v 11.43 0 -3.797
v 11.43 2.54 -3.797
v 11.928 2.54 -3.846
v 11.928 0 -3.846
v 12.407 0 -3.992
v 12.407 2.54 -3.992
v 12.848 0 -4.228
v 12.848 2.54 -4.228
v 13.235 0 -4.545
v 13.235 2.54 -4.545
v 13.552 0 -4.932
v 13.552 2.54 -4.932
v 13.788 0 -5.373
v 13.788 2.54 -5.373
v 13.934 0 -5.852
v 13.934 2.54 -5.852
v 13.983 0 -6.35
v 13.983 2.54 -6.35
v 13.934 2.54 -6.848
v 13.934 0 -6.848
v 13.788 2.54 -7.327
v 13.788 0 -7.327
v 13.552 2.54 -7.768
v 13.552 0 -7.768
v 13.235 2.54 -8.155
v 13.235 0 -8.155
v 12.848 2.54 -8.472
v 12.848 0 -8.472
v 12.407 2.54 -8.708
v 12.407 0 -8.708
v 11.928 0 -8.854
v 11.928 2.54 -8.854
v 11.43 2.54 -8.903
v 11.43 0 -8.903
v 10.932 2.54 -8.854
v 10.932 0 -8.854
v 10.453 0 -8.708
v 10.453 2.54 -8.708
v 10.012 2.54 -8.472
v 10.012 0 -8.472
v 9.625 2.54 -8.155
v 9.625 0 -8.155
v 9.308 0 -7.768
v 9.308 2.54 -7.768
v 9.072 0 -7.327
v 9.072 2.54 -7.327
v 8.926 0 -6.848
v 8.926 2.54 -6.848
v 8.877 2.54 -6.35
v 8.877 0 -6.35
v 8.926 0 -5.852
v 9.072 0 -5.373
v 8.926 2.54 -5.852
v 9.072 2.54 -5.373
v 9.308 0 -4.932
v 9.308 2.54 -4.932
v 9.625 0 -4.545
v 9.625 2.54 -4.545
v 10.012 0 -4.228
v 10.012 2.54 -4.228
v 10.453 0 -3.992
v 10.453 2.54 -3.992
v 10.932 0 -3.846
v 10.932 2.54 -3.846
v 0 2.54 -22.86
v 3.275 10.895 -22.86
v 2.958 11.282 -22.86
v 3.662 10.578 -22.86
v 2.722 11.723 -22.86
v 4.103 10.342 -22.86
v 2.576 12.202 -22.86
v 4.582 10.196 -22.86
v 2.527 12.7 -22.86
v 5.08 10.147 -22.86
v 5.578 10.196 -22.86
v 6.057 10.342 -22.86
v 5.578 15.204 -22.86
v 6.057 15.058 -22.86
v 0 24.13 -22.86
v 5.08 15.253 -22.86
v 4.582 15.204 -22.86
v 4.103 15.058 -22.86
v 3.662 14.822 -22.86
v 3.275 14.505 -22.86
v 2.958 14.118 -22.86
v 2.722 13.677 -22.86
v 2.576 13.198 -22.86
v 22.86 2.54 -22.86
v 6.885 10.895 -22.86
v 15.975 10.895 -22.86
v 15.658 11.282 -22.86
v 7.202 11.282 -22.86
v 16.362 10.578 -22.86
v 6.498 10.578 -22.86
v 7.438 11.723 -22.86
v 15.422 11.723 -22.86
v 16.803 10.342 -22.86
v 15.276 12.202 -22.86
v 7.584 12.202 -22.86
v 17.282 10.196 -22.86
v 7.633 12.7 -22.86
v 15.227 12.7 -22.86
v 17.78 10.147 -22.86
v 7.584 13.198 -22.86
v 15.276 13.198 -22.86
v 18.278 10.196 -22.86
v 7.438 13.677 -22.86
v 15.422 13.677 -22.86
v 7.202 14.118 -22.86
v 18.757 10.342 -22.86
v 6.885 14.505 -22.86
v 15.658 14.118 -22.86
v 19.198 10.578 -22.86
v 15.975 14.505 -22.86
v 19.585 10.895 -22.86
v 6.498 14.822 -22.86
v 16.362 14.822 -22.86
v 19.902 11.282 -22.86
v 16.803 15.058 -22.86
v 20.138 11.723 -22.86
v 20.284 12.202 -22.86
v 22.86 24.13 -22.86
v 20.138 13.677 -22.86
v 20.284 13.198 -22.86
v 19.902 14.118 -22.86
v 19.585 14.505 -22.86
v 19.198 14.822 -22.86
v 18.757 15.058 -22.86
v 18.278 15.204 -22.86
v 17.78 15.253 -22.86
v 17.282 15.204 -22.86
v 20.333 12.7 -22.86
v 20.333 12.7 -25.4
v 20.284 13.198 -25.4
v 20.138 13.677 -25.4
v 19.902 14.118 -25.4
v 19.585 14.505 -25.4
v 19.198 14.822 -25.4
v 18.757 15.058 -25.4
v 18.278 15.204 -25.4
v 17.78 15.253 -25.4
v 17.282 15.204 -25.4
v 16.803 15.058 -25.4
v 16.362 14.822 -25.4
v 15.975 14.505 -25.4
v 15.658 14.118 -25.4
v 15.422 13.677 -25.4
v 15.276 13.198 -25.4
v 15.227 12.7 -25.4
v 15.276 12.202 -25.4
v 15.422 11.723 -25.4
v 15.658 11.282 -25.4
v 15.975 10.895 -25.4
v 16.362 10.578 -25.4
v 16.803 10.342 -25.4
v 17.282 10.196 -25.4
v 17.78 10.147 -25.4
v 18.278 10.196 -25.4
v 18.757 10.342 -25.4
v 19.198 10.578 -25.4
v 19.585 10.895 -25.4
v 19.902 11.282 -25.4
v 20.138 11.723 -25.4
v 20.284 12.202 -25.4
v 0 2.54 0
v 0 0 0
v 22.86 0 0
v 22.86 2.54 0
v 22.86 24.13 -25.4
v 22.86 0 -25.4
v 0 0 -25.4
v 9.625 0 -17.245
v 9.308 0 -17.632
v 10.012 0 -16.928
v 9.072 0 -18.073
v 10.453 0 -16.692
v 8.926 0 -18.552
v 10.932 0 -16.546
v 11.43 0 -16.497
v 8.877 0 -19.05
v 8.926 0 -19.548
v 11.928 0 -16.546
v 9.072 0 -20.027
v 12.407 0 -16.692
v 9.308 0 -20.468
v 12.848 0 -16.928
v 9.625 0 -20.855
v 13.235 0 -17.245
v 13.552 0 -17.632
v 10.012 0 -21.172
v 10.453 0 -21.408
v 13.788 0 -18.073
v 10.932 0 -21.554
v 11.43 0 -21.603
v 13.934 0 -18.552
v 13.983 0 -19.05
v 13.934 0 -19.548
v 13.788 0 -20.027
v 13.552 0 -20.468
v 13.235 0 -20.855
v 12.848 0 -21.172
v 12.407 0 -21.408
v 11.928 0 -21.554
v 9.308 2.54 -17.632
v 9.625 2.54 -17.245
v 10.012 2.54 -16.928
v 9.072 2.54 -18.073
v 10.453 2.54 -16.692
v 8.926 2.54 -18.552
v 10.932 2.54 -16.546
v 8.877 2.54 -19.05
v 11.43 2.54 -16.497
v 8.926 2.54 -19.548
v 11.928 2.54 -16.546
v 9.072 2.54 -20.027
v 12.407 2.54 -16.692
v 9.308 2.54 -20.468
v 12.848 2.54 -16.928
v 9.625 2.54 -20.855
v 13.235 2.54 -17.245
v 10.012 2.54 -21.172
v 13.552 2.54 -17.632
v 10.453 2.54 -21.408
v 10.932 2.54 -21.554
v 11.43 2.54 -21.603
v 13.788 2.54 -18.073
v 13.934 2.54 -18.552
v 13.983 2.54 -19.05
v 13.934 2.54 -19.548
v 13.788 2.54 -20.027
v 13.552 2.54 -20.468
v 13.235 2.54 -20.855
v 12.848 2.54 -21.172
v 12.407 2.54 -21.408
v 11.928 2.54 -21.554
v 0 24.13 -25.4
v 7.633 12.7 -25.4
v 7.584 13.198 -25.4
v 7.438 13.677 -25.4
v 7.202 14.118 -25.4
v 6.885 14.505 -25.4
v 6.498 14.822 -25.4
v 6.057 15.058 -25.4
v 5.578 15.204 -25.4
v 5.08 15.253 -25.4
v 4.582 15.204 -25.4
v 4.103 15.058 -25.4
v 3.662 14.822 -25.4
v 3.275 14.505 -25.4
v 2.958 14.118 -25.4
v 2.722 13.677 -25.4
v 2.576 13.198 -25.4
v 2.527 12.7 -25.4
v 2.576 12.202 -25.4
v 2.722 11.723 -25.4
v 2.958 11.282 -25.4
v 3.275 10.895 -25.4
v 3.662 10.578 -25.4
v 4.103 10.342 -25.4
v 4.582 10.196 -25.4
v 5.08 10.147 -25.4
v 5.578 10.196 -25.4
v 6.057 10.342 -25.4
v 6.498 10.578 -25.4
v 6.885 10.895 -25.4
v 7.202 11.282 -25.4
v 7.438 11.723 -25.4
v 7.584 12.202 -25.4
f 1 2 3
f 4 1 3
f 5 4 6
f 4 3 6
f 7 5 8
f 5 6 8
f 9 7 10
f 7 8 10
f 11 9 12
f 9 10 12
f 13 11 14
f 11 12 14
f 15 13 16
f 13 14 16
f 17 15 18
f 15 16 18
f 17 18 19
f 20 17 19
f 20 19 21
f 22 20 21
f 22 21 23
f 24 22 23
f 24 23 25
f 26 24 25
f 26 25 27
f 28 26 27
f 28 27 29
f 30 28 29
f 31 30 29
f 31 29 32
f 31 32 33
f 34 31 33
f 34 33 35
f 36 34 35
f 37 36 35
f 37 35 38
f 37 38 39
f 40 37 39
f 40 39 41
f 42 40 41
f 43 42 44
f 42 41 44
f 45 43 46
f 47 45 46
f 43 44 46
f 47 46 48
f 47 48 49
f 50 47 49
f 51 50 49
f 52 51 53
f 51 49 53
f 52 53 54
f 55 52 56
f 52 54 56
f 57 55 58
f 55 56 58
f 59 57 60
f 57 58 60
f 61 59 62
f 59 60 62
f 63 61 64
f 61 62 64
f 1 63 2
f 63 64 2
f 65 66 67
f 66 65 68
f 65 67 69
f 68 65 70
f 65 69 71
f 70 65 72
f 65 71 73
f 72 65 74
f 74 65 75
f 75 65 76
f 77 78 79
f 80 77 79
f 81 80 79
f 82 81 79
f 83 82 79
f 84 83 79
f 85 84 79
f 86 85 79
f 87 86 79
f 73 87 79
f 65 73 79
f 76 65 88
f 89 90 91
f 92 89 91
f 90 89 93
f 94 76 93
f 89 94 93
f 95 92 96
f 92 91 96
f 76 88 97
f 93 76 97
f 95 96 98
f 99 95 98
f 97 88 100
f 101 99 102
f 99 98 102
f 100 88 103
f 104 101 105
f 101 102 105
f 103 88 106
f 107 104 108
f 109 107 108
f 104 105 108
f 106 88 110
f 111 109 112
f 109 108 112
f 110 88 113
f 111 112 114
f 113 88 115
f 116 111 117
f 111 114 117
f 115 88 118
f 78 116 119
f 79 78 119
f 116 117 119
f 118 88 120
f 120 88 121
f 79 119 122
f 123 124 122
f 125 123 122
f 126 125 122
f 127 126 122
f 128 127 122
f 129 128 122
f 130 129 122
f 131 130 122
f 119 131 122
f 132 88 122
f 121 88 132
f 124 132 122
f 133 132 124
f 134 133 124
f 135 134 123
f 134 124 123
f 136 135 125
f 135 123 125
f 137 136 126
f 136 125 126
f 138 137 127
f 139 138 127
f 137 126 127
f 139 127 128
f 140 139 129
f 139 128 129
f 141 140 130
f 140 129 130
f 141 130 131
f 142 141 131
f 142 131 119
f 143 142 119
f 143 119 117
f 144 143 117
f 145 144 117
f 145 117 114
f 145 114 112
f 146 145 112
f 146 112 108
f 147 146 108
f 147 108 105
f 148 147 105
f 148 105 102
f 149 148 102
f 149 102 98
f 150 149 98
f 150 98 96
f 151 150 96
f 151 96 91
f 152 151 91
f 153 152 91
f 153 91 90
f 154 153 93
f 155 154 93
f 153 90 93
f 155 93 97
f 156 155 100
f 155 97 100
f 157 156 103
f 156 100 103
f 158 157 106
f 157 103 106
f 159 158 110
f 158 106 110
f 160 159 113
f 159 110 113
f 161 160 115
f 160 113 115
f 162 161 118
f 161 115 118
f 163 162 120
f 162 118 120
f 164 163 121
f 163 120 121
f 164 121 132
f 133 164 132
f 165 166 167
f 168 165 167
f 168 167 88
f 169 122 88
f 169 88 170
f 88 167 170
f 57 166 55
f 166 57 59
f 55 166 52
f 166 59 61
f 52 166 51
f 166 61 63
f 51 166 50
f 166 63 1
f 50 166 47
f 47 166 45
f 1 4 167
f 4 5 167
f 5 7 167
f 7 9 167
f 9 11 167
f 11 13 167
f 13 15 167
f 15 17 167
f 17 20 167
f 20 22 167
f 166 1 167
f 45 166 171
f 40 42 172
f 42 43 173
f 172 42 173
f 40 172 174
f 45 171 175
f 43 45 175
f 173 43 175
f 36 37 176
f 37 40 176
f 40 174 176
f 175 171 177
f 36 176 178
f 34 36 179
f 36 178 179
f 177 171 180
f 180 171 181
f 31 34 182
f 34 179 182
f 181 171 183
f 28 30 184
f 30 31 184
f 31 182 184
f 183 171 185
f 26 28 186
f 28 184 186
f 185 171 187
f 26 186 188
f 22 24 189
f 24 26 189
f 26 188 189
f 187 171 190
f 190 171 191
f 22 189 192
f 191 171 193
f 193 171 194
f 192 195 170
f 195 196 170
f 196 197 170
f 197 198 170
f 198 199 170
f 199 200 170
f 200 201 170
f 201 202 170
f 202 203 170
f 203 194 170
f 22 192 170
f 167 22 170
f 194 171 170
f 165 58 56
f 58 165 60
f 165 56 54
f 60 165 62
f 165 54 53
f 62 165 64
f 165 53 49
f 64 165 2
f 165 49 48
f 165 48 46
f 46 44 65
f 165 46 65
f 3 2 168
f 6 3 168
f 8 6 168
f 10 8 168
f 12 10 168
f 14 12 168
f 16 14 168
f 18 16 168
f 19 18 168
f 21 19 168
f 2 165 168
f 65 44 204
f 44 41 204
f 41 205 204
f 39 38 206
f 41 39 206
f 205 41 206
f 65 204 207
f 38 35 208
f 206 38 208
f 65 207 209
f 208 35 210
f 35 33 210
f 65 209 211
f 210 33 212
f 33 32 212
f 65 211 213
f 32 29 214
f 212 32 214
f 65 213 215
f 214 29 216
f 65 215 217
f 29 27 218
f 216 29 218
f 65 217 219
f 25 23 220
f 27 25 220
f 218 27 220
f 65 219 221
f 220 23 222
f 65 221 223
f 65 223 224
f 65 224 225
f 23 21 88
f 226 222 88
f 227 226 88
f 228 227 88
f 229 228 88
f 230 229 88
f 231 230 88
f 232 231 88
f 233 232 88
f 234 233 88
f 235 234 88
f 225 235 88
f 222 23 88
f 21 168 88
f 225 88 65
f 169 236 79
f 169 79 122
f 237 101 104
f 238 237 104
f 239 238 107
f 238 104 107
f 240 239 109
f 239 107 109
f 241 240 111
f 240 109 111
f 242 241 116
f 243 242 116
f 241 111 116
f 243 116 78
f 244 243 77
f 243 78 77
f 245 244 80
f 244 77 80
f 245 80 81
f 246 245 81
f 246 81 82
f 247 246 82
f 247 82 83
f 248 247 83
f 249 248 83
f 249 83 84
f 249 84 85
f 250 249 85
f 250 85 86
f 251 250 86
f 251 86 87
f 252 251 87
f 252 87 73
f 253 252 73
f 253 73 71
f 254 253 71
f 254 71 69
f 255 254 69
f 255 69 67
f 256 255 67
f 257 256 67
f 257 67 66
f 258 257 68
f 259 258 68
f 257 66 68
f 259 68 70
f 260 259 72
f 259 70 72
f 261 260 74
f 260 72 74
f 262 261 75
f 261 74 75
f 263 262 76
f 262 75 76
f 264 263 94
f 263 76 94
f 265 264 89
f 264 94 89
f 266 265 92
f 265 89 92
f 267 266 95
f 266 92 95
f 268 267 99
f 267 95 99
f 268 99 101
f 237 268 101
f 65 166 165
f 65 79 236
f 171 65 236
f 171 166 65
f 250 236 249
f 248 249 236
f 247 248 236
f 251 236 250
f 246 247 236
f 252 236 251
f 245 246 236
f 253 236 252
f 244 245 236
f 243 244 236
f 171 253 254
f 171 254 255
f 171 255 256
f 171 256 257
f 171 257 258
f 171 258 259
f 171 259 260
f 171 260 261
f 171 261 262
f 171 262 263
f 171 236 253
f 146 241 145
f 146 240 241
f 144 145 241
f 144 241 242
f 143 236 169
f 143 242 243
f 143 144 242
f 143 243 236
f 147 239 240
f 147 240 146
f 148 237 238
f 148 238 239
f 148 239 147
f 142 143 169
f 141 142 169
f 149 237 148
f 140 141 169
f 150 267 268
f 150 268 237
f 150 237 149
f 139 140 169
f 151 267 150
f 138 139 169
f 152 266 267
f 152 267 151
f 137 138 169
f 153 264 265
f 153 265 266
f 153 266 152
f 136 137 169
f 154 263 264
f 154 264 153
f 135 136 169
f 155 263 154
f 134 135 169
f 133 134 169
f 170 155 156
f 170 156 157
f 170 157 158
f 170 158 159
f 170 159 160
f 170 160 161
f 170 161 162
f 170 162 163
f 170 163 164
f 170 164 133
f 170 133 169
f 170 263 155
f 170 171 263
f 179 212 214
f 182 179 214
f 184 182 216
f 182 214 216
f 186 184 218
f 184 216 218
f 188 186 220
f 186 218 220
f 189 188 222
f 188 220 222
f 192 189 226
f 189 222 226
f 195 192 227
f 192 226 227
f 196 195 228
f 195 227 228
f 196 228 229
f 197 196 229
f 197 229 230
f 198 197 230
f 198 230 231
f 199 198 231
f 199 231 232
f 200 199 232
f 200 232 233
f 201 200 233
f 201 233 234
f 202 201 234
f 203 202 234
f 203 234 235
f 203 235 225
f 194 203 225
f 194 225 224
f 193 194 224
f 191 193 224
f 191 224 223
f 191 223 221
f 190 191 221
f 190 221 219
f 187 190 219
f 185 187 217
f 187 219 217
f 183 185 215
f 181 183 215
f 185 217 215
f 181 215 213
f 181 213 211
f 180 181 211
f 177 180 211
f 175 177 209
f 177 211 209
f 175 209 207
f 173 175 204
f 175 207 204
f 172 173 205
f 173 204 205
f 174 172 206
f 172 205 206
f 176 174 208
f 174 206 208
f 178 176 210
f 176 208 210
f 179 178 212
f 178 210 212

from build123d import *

# Parameters (mm, degrees)
SKETCH1_W           = 22.86
SKETCH1_H           = 25.4
BOSS_EXTRUDE1_DEPTH = 24.13
SKETCH2_W           = 22.86
SKETCH2_H           = 21.59
CUT_EXTRUDE1_DEPTH  = 42.832959494
SKETCH3_R           = 2.5527
CUT_EXTRUDE2_DEPTH  = 41.421129376
SKETCH4_R           = 2.5527
CUT_EXTRUDE3_DEPTH  = 41.341245643


with BuildPart() as part:
    # Sketch1 → Boss-Extrude1 (new body)
    with BuildSketch(Plane(origin=(0, 0, 0), x_dir=(1, 0, 0), z_dir=(0, 1, 0))):
        with Locations((11.43, 12.7)):
            Rectangle(SKETCH1_W, SKETCH1_H)
    extrude(amount=BOSS_EXTRUDE1_DEPTH)

    # Sketch2 → Cut-Extrude1 (cut, through all)
    with BuildSketch(Plane(origin=(22.86, 0, 0), x_dir=(0, 0, -1), z_dir=(1, 0, 0))):
        with Locations((11.43, 13.335)):
            Rectangle(SKETCH2_W, SKETCH2_H)
    extrude(amount=-CUT_EXTRUDE1_DEPTH, mode=Mode.SUBTRACT)

    # Sketch3 → Cut-Extrude2 (cut, through all)
    with BuildSketch(Plane(origin=(0, 2.54, 0), x_dir=(1, 0, 0), z_dir=(0, 1, 0))):
        with Locations(Location((11.43, 6.35, 0), (0, 0, 270))):
            Circle(SKETCH3_R)
        with Locations(Location((11.43, 19.05, 0), (0, 0, 270))):
            Circle(SKETCH3_R)
    extrude(amount=-CUT_EXTRUDE2_DEPTH, mode=Mode.SUBTRACT)

    # Sketch4 → Cut-Extrude3 (cut, through all)
    with BuildSketch(Plane.XY.offset(-22.86)):
        with Locations((17.78, 12.7)):
            Circle(SKETCH4_R)
        with Locations((5.08, 12.7)):
            Circle(SKETCH4_R)
    extrude(amount=-CUT_EXTRUDE3_DEPTH, mode=Mode.SUBTRACT)


solid = part.part
